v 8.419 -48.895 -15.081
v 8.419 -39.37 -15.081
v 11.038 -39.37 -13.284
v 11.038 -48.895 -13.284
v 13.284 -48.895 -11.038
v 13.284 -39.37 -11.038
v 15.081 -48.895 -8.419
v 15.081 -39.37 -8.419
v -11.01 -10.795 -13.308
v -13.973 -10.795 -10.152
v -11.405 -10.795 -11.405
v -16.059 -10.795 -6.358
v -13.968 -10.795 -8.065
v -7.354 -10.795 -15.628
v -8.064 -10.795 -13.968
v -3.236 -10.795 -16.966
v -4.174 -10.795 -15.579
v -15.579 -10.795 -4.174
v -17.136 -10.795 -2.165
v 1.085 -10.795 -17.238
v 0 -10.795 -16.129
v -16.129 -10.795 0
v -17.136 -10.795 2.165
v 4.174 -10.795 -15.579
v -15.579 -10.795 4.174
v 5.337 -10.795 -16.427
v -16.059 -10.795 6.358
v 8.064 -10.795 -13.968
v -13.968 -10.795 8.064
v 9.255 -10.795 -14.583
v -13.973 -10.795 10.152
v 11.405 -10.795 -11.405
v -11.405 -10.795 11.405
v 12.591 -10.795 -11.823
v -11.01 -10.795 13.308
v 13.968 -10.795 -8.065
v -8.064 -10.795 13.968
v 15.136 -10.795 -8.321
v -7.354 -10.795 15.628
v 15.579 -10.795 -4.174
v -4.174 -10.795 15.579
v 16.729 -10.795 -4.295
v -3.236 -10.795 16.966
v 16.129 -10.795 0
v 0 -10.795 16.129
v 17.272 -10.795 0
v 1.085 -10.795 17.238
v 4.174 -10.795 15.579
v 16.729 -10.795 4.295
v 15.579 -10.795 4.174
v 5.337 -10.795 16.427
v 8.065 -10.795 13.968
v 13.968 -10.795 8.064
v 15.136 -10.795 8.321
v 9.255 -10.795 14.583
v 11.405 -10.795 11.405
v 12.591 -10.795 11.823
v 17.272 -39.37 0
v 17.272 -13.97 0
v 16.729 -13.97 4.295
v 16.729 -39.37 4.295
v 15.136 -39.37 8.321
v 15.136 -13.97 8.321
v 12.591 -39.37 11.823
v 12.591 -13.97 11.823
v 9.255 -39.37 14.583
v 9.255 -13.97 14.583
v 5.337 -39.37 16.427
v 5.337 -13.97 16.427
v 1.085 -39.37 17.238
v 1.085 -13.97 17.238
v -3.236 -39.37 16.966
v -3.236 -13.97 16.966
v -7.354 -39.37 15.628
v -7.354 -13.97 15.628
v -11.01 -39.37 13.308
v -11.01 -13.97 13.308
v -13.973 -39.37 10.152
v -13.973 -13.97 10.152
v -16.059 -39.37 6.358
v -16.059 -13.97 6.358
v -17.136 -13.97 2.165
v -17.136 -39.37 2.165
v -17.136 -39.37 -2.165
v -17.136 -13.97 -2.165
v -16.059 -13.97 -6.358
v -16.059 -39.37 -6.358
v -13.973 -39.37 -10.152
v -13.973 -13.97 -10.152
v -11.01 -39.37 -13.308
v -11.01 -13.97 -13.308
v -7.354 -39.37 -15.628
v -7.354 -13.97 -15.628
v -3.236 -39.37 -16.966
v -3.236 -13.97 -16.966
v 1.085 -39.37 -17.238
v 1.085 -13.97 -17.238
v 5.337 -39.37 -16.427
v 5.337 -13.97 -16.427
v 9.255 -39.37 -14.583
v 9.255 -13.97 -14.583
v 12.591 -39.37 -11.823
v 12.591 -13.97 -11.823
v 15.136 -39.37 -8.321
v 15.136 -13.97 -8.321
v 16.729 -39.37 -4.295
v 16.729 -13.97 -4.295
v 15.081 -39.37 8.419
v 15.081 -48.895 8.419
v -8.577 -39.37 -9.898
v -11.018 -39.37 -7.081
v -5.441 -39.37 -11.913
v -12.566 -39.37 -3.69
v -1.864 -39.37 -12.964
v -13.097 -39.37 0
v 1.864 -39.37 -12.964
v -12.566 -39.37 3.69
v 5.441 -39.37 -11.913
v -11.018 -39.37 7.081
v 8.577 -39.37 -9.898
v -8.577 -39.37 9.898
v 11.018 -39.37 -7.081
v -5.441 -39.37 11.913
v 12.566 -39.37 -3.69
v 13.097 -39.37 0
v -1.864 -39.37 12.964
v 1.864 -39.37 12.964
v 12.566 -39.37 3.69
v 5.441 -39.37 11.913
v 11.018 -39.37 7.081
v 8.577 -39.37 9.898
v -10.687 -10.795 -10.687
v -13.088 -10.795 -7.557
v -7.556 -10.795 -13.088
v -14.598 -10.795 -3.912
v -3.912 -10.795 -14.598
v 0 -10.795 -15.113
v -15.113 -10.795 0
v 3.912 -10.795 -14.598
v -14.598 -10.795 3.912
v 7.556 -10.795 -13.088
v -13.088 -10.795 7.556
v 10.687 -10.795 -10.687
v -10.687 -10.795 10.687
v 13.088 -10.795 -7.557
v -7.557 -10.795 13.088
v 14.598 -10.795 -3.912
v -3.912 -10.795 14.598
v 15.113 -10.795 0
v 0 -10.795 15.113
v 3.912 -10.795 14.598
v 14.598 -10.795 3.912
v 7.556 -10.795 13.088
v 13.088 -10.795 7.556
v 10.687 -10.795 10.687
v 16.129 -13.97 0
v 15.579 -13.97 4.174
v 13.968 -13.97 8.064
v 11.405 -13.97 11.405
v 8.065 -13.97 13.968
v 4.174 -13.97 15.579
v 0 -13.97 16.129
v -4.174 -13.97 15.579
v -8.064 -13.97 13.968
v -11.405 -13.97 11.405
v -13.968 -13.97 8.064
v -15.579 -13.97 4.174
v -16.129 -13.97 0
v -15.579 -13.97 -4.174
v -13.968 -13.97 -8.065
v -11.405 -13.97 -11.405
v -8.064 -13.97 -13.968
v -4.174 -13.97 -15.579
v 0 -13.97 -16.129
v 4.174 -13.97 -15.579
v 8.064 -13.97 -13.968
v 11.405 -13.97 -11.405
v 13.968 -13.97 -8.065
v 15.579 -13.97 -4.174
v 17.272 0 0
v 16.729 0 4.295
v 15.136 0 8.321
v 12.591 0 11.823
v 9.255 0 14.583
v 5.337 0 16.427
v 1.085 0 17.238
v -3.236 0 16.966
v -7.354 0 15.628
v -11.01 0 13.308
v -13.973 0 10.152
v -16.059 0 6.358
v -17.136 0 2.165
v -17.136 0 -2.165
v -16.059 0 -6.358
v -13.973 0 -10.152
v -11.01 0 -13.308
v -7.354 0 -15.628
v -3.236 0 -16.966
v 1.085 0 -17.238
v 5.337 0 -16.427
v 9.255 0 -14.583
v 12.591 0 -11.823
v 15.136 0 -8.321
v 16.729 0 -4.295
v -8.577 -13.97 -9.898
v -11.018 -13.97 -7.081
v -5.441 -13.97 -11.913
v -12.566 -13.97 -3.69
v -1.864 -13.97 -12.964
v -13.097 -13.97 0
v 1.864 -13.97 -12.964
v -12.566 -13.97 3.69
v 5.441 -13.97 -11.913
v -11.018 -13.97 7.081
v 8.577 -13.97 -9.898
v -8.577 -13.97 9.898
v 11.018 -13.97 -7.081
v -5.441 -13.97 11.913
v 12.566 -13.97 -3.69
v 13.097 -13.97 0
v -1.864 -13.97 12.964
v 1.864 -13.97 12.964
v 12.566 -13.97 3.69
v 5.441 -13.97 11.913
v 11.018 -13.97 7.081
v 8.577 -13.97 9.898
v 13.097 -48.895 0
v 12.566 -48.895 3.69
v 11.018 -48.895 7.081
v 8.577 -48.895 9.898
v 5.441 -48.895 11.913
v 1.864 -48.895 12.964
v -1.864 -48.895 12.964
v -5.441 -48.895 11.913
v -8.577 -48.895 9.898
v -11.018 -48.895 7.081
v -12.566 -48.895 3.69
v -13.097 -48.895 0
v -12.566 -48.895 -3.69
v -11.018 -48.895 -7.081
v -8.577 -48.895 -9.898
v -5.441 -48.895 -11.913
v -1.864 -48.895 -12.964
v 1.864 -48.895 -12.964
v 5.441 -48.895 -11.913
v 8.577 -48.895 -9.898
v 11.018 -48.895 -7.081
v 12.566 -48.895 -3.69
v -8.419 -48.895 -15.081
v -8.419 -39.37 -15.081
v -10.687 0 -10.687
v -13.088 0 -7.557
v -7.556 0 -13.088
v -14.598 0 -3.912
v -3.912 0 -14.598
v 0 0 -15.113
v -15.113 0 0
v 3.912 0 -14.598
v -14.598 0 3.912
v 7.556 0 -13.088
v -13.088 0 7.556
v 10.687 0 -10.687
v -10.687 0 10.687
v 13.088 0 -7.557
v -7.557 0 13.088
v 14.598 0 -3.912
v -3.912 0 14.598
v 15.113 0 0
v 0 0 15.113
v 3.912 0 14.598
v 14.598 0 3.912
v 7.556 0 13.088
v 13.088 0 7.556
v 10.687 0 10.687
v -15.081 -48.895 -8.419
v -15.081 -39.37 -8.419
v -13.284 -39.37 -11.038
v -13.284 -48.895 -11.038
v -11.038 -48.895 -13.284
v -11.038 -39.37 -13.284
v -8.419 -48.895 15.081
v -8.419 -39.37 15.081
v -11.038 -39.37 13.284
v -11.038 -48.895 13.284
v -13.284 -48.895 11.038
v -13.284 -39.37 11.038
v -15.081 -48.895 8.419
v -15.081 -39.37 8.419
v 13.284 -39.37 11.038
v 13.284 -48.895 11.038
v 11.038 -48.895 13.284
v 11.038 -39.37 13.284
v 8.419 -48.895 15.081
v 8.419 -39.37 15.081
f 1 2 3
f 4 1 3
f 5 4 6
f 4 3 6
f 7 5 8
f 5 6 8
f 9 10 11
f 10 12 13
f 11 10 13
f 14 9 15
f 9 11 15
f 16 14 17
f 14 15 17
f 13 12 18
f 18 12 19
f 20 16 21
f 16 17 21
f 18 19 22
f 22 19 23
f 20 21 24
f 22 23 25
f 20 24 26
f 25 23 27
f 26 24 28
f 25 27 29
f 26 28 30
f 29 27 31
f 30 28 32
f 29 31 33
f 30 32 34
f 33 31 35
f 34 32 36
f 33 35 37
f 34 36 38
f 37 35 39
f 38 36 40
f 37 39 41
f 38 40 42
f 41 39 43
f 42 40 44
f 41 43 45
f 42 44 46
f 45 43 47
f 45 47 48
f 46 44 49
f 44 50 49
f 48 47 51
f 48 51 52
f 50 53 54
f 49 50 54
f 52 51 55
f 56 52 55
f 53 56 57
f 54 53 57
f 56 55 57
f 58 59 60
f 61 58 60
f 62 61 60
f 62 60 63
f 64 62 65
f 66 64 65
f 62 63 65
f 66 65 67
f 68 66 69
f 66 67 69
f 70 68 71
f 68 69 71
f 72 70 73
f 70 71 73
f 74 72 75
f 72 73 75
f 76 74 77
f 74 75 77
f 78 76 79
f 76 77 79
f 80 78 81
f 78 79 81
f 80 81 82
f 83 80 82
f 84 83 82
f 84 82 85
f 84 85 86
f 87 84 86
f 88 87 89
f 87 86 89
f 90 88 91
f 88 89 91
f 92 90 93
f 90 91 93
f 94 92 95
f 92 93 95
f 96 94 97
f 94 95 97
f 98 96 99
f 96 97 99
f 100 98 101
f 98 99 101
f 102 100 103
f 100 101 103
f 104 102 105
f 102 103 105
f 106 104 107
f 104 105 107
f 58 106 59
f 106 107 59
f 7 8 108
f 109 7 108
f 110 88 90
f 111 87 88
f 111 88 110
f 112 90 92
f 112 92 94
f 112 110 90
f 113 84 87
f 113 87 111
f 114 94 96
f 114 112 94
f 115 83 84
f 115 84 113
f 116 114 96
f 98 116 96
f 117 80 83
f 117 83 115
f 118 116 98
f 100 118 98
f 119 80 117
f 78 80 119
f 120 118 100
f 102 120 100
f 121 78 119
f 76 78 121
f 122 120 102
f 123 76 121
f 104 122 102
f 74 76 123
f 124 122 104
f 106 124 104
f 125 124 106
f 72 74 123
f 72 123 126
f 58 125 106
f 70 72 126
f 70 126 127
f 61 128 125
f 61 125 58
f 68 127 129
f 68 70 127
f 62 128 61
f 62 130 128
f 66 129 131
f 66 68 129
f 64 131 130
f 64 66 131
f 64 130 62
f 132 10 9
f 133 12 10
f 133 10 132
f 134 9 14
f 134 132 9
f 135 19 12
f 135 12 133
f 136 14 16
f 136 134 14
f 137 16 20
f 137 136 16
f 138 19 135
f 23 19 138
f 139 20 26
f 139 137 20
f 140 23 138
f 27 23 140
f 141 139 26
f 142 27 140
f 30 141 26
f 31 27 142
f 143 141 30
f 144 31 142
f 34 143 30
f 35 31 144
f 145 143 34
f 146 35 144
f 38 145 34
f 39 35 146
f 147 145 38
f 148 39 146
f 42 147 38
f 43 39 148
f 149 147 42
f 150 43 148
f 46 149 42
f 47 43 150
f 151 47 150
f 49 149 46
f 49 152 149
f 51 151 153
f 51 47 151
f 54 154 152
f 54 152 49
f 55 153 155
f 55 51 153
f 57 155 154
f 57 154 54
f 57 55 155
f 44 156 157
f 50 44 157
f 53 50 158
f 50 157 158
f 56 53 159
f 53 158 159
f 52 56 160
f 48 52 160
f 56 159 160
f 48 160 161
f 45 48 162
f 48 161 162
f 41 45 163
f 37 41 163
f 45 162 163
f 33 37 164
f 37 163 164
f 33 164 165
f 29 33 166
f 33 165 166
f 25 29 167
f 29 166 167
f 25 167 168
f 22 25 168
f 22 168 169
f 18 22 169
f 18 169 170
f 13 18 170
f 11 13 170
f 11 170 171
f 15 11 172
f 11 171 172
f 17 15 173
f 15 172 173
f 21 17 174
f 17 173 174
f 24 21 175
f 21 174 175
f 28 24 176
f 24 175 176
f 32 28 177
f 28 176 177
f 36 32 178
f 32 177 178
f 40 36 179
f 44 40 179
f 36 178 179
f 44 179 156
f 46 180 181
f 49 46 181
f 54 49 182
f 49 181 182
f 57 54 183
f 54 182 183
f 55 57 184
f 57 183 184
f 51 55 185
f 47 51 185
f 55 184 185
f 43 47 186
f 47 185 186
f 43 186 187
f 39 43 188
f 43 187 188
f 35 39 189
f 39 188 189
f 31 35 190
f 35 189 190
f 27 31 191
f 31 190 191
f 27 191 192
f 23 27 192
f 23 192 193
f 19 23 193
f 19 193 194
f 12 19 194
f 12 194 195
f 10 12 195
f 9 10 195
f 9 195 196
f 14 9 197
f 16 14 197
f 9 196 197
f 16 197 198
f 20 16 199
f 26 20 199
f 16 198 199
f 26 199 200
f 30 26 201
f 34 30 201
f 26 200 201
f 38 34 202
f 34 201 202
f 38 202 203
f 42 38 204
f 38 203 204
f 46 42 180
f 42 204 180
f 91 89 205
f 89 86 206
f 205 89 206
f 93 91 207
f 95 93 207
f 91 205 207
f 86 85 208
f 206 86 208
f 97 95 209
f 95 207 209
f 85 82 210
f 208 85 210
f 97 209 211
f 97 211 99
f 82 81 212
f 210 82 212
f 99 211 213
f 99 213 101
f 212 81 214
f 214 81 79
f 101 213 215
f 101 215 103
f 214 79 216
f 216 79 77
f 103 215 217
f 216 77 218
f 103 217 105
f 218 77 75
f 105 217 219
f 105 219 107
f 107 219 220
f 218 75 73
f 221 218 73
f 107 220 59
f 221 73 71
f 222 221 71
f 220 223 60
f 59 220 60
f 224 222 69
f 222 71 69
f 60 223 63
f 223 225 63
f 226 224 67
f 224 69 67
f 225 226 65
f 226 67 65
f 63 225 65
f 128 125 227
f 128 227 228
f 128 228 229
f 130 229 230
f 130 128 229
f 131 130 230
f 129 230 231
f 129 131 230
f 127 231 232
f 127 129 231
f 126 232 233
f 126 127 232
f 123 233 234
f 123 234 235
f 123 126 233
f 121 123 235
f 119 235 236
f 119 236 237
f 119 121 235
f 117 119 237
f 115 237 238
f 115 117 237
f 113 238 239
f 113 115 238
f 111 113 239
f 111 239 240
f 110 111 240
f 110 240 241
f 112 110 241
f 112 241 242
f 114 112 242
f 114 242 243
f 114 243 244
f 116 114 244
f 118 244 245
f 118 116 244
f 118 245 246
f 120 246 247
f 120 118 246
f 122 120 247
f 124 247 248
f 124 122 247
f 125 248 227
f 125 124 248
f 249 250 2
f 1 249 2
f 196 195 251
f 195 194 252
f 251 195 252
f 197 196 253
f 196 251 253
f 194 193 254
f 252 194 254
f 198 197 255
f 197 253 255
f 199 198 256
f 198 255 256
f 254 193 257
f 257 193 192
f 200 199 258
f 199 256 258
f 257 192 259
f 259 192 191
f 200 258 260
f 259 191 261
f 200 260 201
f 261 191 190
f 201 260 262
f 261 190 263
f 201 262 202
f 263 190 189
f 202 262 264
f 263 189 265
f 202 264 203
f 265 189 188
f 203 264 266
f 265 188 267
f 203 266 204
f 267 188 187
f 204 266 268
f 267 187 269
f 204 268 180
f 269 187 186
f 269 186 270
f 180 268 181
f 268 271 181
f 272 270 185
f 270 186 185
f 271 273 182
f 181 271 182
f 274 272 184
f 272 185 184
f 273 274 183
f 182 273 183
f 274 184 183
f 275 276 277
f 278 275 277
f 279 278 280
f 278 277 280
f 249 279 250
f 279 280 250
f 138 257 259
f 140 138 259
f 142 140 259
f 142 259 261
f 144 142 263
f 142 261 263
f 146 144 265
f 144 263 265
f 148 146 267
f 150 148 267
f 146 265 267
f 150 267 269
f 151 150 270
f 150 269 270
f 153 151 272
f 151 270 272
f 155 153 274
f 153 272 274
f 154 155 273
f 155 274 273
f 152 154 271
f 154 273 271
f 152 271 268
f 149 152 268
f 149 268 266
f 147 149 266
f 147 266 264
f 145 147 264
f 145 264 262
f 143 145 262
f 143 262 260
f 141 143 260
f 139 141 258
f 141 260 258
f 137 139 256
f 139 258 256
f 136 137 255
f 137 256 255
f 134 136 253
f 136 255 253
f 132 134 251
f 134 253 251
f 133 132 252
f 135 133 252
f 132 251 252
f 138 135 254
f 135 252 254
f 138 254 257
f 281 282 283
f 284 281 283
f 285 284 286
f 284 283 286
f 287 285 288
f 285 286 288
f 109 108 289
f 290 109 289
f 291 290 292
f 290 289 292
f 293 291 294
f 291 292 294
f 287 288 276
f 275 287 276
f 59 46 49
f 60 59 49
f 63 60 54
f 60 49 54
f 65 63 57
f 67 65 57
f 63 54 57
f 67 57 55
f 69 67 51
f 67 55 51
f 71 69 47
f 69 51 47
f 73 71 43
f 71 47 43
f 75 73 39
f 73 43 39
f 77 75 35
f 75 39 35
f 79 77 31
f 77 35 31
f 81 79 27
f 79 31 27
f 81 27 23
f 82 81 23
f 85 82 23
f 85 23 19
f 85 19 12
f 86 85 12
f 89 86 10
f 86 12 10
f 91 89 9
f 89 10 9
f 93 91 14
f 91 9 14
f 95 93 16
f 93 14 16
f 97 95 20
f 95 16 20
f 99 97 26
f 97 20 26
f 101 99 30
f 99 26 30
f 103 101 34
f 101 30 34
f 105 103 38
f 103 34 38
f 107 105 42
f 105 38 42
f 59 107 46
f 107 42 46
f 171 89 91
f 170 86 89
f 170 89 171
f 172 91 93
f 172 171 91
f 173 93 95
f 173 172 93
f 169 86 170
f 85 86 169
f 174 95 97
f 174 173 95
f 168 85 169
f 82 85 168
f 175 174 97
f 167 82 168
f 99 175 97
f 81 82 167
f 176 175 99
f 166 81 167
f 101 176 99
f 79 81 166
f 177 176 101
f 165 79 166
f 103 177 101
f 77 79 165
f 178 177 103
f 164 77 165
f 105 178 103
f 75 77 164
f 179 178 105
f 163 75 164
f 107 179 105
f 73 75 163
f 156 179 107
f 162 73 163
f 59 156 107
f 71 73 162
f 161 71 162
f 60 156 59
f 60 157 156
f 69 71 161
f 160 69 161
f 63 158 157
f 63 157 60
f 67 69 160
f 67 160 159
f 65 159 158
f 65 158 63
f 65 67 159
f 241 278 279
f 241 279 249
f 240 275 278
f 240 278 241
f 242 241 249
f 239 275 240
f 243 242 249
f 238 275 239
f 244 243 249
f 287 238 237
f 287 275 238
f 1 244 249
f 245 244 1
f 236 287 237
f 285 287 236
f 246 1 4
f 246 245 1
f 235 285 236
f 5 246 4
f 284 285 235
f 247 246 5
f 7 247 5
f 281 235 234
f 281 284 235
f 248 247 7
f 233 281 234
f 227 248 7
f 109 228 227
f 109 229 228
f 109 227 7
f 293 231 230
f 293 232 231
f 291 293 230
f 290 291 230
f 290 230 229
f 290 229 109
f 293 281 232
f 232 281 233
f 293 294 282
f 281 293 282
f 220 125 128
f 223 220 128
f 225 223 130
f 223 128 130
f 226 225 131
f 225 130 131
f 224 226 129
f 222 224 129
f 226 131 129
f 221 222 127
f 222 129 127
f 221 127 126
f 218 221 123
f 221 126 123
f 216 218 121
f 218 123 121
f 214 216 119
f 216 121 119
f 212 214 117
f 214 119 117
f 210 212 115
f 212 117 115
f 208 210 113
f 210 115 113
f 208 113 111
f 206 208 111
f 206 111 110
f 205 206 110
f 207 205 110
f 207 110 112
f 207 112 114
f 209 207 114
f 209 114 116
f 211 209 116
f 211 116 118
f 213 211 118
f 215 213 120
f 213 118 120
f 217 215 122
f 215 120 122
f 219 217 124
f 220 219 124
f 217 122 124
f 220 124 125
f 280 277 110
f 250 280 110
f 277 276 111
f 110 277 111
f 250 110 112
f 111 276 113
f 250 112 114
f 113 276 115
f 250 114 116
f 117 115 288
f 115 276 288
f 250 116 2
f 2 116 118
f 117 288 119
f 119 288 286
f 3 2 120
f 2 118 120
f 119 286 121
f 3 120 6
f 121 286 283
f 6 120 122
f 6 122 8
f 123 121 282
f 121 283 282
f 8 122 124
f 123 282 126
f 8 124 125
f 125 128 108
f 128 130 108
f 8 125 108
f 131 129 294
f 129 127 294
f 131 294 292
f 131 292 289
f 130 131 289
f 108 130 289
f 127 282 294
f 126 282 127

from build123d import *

# Parameters (mm, degrees)
F0_R      = 17.272
F1_DEPTH  = 10.795
F2_R      = 15.113
F3_DEPTH  = 10.795
F4_R      = 17.272
F5_DEPTH  = 3.175
F6_R      = 16.129
F7_DEPTH  = 3.175
F8_R      = 17.272
F9_DEPTH  = 25.4
F10_R     = 13.096875
F11_DEPTH = 25.4
F12_R     = 13.096875
F13_DEPTH = 9.525


with BuildPart() as f1:
    # F0 (on Front) → F1 (new body)
    with BuildSketch(Plane.XZ):
        Circle(F0_R)
    extrude(amount=F1_DEPTH)

    # F2 (on face) → F3 (cut, through all)
    with BuildSketch(Plane(origin=(0, 0, 0), x_dir=(-1, 0, 0), z_dir=(0, 1, 0))):
        Circle(F2_R)
    extrude(amount=-F3_DEPTH, mode=Mode.SUBTRACT)


with BuildPart() as f5:
    # F4 (on face) → F5 (new body)
    with BuildSketch(Plane.XZ.offset(10.795)):
        Circle(F4_R)
    extrude(amount=F5_DEPTH)

    # F6 (on face) → F7 (cut, through all)
    with BuildSketch(Plane.XZ.offset(13.97)):
        Circle(F6_R)
    extrude(amount=-F7_DEPTH, mode=Mode.SUBTRACT)


with BuildPart() as f9:
    # F8 (on face) → F9 (new body)
    with BuildSketch(Plane.XZ.offset(13.97)):
        Circle(F8_R)
    extrude(amount=F9_DEPTH)

    # F10 (on face) → F11 (cut, through all)
    with BuildSketch(Plane.XZ.offset(39.37)):
        Circle(F10_R)
    extrude(amount=-F11_DEPTH, mode=Mode.SUBTRACT)


with BuildPart() as f13:
    # F12 (on face) → F13 (new body)
    with BuildSketch(Plane.XZ.offset(39.37)):
        with BuildLine():
            Line((15.08125, -8.4189003105), (15.08125, 8.4189003105))
            ThreePointArc((15.08125, 8.4189003105), (12.2131483247, 12.2131483247), (8.4189003105, 15.08125))
            Line((8.4189003105, 15.08125), (-8.4189003105, 15.08125))
            ThreePointArc((-8.4189003105, 15.08125), (-12.2131483247, 12.2131483247), (-15.08125, 8.4189003105))
            Line((-15.08125, 8.4189003105), (-15.08125, -8.4189003105))
            ThreePointArc((-15.08125, -8.4189003105), (-12.2131483247, -12.2131483247), (-8.4189003105, -15.08125))
            Line((-8.4189003105, -15.08125), (8.4189003105, -15.08125))
            ThreePointArc((8.4189003105, -15.08125), (12.2131483247, -12.2131483247), (15.08125, -8.4189003105))
        make_face()
        Circle(F12_R, mode=Mode.SUBTRACT)
    extrude(amount=F13_DEPTH)


solid = Compound([f1.part, f5.part, f9.part, f13.part])
